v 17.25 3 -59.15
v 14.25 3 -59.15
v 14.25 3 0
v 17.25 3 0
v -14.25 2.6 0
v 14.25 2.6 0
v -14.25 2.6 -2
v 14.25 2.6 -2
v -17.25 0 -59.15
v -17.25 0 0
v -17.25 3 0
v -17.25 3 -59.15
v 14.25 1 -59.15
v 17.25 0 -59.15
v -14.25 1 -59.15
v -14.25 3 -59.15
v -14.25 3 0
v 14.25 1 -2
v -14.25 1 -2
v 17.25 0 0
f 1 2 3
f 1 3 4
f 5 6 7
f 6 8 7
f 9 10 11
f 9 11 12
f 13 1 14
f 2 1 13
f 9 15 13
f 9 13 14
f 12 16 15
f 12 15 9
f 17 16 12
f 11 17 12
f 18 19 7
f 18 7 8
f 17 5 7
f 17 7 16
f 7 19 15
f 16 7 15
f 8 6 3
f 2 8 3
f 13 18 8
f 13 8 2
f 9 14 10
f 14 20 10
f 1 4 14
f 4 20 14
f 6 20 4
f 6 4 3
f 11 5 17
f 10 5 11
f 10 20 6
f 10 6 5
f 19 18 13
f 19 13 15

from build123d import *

# Parameters (mm, degrees)
BOSS_EXTRUDE1_DEPTH = 2.6
SKETCH3_W           = 3
SKETCH3_H           = 59.15
BOSS_EXTRUDE2_DEPTH = 0.4
SKETCH5_W           = 28.5
SKETCH5_H           = 1
BOSS_EXTRUDE3_DEPTH = 57.15


with BuildPart() as part:
    # Sketch1 → Boss-Extrude1 (new body)
    with BuildSketch(Plane(origin=(0, 0, 0), x_dir=(1, 0, 0), z_dir=(0, 1, 0))):
        Polygon((0, 0), (17.25, 0), (17.25, 59.15), (14.25, 59.15), (14.25, 2), (0, 2), align=None)
    boss_extrude1 = extrude(amount=BOSS_EXTRUDE1_DEPTH)

    # Sketch3 → Boss-Extrude2 (add)
    with BuildSketch(Plane(origin=(0, 2.6, 0), x_dir=(1, 0, 0), z_dir=(0, 1, 0))):
        with Locations((15.75, 29.575)):
            Rectangle(SKETCH3_W, SKETCH3_H)
    boss_extrude2 = extrude(amount=BOSS_EXTRUDE2_DEPTH)

    # Mirror2: Boss-Extrude1, Boss-Extrude2 across plane
    add(boss_extrude1.mirror(Plane(origin=(0, 0, 0), x_dir=(0, 0, 1), z_dir=(1, 0, 0))))
    add(boss_extrude2.mirror(Plane(origin=(0, 0, 0), x_dir=(0, 0, 1), z_dir=(1, 0, 0))))

    # Sketch5 → Boss-Extrude3 (add, through all)
    with BuildSketch(Plane(origin=(0, 0, -2), x_dir=(-1, 0, 0), z_dir=(0, 0, -1))):
        with Locations((0, 0.5)):
            Rectangle(SKETCH5_W, SKETCH5_H)
    extrude(amount=BOSS_EXTRUDE3_DEPTH)


solid = part.part
